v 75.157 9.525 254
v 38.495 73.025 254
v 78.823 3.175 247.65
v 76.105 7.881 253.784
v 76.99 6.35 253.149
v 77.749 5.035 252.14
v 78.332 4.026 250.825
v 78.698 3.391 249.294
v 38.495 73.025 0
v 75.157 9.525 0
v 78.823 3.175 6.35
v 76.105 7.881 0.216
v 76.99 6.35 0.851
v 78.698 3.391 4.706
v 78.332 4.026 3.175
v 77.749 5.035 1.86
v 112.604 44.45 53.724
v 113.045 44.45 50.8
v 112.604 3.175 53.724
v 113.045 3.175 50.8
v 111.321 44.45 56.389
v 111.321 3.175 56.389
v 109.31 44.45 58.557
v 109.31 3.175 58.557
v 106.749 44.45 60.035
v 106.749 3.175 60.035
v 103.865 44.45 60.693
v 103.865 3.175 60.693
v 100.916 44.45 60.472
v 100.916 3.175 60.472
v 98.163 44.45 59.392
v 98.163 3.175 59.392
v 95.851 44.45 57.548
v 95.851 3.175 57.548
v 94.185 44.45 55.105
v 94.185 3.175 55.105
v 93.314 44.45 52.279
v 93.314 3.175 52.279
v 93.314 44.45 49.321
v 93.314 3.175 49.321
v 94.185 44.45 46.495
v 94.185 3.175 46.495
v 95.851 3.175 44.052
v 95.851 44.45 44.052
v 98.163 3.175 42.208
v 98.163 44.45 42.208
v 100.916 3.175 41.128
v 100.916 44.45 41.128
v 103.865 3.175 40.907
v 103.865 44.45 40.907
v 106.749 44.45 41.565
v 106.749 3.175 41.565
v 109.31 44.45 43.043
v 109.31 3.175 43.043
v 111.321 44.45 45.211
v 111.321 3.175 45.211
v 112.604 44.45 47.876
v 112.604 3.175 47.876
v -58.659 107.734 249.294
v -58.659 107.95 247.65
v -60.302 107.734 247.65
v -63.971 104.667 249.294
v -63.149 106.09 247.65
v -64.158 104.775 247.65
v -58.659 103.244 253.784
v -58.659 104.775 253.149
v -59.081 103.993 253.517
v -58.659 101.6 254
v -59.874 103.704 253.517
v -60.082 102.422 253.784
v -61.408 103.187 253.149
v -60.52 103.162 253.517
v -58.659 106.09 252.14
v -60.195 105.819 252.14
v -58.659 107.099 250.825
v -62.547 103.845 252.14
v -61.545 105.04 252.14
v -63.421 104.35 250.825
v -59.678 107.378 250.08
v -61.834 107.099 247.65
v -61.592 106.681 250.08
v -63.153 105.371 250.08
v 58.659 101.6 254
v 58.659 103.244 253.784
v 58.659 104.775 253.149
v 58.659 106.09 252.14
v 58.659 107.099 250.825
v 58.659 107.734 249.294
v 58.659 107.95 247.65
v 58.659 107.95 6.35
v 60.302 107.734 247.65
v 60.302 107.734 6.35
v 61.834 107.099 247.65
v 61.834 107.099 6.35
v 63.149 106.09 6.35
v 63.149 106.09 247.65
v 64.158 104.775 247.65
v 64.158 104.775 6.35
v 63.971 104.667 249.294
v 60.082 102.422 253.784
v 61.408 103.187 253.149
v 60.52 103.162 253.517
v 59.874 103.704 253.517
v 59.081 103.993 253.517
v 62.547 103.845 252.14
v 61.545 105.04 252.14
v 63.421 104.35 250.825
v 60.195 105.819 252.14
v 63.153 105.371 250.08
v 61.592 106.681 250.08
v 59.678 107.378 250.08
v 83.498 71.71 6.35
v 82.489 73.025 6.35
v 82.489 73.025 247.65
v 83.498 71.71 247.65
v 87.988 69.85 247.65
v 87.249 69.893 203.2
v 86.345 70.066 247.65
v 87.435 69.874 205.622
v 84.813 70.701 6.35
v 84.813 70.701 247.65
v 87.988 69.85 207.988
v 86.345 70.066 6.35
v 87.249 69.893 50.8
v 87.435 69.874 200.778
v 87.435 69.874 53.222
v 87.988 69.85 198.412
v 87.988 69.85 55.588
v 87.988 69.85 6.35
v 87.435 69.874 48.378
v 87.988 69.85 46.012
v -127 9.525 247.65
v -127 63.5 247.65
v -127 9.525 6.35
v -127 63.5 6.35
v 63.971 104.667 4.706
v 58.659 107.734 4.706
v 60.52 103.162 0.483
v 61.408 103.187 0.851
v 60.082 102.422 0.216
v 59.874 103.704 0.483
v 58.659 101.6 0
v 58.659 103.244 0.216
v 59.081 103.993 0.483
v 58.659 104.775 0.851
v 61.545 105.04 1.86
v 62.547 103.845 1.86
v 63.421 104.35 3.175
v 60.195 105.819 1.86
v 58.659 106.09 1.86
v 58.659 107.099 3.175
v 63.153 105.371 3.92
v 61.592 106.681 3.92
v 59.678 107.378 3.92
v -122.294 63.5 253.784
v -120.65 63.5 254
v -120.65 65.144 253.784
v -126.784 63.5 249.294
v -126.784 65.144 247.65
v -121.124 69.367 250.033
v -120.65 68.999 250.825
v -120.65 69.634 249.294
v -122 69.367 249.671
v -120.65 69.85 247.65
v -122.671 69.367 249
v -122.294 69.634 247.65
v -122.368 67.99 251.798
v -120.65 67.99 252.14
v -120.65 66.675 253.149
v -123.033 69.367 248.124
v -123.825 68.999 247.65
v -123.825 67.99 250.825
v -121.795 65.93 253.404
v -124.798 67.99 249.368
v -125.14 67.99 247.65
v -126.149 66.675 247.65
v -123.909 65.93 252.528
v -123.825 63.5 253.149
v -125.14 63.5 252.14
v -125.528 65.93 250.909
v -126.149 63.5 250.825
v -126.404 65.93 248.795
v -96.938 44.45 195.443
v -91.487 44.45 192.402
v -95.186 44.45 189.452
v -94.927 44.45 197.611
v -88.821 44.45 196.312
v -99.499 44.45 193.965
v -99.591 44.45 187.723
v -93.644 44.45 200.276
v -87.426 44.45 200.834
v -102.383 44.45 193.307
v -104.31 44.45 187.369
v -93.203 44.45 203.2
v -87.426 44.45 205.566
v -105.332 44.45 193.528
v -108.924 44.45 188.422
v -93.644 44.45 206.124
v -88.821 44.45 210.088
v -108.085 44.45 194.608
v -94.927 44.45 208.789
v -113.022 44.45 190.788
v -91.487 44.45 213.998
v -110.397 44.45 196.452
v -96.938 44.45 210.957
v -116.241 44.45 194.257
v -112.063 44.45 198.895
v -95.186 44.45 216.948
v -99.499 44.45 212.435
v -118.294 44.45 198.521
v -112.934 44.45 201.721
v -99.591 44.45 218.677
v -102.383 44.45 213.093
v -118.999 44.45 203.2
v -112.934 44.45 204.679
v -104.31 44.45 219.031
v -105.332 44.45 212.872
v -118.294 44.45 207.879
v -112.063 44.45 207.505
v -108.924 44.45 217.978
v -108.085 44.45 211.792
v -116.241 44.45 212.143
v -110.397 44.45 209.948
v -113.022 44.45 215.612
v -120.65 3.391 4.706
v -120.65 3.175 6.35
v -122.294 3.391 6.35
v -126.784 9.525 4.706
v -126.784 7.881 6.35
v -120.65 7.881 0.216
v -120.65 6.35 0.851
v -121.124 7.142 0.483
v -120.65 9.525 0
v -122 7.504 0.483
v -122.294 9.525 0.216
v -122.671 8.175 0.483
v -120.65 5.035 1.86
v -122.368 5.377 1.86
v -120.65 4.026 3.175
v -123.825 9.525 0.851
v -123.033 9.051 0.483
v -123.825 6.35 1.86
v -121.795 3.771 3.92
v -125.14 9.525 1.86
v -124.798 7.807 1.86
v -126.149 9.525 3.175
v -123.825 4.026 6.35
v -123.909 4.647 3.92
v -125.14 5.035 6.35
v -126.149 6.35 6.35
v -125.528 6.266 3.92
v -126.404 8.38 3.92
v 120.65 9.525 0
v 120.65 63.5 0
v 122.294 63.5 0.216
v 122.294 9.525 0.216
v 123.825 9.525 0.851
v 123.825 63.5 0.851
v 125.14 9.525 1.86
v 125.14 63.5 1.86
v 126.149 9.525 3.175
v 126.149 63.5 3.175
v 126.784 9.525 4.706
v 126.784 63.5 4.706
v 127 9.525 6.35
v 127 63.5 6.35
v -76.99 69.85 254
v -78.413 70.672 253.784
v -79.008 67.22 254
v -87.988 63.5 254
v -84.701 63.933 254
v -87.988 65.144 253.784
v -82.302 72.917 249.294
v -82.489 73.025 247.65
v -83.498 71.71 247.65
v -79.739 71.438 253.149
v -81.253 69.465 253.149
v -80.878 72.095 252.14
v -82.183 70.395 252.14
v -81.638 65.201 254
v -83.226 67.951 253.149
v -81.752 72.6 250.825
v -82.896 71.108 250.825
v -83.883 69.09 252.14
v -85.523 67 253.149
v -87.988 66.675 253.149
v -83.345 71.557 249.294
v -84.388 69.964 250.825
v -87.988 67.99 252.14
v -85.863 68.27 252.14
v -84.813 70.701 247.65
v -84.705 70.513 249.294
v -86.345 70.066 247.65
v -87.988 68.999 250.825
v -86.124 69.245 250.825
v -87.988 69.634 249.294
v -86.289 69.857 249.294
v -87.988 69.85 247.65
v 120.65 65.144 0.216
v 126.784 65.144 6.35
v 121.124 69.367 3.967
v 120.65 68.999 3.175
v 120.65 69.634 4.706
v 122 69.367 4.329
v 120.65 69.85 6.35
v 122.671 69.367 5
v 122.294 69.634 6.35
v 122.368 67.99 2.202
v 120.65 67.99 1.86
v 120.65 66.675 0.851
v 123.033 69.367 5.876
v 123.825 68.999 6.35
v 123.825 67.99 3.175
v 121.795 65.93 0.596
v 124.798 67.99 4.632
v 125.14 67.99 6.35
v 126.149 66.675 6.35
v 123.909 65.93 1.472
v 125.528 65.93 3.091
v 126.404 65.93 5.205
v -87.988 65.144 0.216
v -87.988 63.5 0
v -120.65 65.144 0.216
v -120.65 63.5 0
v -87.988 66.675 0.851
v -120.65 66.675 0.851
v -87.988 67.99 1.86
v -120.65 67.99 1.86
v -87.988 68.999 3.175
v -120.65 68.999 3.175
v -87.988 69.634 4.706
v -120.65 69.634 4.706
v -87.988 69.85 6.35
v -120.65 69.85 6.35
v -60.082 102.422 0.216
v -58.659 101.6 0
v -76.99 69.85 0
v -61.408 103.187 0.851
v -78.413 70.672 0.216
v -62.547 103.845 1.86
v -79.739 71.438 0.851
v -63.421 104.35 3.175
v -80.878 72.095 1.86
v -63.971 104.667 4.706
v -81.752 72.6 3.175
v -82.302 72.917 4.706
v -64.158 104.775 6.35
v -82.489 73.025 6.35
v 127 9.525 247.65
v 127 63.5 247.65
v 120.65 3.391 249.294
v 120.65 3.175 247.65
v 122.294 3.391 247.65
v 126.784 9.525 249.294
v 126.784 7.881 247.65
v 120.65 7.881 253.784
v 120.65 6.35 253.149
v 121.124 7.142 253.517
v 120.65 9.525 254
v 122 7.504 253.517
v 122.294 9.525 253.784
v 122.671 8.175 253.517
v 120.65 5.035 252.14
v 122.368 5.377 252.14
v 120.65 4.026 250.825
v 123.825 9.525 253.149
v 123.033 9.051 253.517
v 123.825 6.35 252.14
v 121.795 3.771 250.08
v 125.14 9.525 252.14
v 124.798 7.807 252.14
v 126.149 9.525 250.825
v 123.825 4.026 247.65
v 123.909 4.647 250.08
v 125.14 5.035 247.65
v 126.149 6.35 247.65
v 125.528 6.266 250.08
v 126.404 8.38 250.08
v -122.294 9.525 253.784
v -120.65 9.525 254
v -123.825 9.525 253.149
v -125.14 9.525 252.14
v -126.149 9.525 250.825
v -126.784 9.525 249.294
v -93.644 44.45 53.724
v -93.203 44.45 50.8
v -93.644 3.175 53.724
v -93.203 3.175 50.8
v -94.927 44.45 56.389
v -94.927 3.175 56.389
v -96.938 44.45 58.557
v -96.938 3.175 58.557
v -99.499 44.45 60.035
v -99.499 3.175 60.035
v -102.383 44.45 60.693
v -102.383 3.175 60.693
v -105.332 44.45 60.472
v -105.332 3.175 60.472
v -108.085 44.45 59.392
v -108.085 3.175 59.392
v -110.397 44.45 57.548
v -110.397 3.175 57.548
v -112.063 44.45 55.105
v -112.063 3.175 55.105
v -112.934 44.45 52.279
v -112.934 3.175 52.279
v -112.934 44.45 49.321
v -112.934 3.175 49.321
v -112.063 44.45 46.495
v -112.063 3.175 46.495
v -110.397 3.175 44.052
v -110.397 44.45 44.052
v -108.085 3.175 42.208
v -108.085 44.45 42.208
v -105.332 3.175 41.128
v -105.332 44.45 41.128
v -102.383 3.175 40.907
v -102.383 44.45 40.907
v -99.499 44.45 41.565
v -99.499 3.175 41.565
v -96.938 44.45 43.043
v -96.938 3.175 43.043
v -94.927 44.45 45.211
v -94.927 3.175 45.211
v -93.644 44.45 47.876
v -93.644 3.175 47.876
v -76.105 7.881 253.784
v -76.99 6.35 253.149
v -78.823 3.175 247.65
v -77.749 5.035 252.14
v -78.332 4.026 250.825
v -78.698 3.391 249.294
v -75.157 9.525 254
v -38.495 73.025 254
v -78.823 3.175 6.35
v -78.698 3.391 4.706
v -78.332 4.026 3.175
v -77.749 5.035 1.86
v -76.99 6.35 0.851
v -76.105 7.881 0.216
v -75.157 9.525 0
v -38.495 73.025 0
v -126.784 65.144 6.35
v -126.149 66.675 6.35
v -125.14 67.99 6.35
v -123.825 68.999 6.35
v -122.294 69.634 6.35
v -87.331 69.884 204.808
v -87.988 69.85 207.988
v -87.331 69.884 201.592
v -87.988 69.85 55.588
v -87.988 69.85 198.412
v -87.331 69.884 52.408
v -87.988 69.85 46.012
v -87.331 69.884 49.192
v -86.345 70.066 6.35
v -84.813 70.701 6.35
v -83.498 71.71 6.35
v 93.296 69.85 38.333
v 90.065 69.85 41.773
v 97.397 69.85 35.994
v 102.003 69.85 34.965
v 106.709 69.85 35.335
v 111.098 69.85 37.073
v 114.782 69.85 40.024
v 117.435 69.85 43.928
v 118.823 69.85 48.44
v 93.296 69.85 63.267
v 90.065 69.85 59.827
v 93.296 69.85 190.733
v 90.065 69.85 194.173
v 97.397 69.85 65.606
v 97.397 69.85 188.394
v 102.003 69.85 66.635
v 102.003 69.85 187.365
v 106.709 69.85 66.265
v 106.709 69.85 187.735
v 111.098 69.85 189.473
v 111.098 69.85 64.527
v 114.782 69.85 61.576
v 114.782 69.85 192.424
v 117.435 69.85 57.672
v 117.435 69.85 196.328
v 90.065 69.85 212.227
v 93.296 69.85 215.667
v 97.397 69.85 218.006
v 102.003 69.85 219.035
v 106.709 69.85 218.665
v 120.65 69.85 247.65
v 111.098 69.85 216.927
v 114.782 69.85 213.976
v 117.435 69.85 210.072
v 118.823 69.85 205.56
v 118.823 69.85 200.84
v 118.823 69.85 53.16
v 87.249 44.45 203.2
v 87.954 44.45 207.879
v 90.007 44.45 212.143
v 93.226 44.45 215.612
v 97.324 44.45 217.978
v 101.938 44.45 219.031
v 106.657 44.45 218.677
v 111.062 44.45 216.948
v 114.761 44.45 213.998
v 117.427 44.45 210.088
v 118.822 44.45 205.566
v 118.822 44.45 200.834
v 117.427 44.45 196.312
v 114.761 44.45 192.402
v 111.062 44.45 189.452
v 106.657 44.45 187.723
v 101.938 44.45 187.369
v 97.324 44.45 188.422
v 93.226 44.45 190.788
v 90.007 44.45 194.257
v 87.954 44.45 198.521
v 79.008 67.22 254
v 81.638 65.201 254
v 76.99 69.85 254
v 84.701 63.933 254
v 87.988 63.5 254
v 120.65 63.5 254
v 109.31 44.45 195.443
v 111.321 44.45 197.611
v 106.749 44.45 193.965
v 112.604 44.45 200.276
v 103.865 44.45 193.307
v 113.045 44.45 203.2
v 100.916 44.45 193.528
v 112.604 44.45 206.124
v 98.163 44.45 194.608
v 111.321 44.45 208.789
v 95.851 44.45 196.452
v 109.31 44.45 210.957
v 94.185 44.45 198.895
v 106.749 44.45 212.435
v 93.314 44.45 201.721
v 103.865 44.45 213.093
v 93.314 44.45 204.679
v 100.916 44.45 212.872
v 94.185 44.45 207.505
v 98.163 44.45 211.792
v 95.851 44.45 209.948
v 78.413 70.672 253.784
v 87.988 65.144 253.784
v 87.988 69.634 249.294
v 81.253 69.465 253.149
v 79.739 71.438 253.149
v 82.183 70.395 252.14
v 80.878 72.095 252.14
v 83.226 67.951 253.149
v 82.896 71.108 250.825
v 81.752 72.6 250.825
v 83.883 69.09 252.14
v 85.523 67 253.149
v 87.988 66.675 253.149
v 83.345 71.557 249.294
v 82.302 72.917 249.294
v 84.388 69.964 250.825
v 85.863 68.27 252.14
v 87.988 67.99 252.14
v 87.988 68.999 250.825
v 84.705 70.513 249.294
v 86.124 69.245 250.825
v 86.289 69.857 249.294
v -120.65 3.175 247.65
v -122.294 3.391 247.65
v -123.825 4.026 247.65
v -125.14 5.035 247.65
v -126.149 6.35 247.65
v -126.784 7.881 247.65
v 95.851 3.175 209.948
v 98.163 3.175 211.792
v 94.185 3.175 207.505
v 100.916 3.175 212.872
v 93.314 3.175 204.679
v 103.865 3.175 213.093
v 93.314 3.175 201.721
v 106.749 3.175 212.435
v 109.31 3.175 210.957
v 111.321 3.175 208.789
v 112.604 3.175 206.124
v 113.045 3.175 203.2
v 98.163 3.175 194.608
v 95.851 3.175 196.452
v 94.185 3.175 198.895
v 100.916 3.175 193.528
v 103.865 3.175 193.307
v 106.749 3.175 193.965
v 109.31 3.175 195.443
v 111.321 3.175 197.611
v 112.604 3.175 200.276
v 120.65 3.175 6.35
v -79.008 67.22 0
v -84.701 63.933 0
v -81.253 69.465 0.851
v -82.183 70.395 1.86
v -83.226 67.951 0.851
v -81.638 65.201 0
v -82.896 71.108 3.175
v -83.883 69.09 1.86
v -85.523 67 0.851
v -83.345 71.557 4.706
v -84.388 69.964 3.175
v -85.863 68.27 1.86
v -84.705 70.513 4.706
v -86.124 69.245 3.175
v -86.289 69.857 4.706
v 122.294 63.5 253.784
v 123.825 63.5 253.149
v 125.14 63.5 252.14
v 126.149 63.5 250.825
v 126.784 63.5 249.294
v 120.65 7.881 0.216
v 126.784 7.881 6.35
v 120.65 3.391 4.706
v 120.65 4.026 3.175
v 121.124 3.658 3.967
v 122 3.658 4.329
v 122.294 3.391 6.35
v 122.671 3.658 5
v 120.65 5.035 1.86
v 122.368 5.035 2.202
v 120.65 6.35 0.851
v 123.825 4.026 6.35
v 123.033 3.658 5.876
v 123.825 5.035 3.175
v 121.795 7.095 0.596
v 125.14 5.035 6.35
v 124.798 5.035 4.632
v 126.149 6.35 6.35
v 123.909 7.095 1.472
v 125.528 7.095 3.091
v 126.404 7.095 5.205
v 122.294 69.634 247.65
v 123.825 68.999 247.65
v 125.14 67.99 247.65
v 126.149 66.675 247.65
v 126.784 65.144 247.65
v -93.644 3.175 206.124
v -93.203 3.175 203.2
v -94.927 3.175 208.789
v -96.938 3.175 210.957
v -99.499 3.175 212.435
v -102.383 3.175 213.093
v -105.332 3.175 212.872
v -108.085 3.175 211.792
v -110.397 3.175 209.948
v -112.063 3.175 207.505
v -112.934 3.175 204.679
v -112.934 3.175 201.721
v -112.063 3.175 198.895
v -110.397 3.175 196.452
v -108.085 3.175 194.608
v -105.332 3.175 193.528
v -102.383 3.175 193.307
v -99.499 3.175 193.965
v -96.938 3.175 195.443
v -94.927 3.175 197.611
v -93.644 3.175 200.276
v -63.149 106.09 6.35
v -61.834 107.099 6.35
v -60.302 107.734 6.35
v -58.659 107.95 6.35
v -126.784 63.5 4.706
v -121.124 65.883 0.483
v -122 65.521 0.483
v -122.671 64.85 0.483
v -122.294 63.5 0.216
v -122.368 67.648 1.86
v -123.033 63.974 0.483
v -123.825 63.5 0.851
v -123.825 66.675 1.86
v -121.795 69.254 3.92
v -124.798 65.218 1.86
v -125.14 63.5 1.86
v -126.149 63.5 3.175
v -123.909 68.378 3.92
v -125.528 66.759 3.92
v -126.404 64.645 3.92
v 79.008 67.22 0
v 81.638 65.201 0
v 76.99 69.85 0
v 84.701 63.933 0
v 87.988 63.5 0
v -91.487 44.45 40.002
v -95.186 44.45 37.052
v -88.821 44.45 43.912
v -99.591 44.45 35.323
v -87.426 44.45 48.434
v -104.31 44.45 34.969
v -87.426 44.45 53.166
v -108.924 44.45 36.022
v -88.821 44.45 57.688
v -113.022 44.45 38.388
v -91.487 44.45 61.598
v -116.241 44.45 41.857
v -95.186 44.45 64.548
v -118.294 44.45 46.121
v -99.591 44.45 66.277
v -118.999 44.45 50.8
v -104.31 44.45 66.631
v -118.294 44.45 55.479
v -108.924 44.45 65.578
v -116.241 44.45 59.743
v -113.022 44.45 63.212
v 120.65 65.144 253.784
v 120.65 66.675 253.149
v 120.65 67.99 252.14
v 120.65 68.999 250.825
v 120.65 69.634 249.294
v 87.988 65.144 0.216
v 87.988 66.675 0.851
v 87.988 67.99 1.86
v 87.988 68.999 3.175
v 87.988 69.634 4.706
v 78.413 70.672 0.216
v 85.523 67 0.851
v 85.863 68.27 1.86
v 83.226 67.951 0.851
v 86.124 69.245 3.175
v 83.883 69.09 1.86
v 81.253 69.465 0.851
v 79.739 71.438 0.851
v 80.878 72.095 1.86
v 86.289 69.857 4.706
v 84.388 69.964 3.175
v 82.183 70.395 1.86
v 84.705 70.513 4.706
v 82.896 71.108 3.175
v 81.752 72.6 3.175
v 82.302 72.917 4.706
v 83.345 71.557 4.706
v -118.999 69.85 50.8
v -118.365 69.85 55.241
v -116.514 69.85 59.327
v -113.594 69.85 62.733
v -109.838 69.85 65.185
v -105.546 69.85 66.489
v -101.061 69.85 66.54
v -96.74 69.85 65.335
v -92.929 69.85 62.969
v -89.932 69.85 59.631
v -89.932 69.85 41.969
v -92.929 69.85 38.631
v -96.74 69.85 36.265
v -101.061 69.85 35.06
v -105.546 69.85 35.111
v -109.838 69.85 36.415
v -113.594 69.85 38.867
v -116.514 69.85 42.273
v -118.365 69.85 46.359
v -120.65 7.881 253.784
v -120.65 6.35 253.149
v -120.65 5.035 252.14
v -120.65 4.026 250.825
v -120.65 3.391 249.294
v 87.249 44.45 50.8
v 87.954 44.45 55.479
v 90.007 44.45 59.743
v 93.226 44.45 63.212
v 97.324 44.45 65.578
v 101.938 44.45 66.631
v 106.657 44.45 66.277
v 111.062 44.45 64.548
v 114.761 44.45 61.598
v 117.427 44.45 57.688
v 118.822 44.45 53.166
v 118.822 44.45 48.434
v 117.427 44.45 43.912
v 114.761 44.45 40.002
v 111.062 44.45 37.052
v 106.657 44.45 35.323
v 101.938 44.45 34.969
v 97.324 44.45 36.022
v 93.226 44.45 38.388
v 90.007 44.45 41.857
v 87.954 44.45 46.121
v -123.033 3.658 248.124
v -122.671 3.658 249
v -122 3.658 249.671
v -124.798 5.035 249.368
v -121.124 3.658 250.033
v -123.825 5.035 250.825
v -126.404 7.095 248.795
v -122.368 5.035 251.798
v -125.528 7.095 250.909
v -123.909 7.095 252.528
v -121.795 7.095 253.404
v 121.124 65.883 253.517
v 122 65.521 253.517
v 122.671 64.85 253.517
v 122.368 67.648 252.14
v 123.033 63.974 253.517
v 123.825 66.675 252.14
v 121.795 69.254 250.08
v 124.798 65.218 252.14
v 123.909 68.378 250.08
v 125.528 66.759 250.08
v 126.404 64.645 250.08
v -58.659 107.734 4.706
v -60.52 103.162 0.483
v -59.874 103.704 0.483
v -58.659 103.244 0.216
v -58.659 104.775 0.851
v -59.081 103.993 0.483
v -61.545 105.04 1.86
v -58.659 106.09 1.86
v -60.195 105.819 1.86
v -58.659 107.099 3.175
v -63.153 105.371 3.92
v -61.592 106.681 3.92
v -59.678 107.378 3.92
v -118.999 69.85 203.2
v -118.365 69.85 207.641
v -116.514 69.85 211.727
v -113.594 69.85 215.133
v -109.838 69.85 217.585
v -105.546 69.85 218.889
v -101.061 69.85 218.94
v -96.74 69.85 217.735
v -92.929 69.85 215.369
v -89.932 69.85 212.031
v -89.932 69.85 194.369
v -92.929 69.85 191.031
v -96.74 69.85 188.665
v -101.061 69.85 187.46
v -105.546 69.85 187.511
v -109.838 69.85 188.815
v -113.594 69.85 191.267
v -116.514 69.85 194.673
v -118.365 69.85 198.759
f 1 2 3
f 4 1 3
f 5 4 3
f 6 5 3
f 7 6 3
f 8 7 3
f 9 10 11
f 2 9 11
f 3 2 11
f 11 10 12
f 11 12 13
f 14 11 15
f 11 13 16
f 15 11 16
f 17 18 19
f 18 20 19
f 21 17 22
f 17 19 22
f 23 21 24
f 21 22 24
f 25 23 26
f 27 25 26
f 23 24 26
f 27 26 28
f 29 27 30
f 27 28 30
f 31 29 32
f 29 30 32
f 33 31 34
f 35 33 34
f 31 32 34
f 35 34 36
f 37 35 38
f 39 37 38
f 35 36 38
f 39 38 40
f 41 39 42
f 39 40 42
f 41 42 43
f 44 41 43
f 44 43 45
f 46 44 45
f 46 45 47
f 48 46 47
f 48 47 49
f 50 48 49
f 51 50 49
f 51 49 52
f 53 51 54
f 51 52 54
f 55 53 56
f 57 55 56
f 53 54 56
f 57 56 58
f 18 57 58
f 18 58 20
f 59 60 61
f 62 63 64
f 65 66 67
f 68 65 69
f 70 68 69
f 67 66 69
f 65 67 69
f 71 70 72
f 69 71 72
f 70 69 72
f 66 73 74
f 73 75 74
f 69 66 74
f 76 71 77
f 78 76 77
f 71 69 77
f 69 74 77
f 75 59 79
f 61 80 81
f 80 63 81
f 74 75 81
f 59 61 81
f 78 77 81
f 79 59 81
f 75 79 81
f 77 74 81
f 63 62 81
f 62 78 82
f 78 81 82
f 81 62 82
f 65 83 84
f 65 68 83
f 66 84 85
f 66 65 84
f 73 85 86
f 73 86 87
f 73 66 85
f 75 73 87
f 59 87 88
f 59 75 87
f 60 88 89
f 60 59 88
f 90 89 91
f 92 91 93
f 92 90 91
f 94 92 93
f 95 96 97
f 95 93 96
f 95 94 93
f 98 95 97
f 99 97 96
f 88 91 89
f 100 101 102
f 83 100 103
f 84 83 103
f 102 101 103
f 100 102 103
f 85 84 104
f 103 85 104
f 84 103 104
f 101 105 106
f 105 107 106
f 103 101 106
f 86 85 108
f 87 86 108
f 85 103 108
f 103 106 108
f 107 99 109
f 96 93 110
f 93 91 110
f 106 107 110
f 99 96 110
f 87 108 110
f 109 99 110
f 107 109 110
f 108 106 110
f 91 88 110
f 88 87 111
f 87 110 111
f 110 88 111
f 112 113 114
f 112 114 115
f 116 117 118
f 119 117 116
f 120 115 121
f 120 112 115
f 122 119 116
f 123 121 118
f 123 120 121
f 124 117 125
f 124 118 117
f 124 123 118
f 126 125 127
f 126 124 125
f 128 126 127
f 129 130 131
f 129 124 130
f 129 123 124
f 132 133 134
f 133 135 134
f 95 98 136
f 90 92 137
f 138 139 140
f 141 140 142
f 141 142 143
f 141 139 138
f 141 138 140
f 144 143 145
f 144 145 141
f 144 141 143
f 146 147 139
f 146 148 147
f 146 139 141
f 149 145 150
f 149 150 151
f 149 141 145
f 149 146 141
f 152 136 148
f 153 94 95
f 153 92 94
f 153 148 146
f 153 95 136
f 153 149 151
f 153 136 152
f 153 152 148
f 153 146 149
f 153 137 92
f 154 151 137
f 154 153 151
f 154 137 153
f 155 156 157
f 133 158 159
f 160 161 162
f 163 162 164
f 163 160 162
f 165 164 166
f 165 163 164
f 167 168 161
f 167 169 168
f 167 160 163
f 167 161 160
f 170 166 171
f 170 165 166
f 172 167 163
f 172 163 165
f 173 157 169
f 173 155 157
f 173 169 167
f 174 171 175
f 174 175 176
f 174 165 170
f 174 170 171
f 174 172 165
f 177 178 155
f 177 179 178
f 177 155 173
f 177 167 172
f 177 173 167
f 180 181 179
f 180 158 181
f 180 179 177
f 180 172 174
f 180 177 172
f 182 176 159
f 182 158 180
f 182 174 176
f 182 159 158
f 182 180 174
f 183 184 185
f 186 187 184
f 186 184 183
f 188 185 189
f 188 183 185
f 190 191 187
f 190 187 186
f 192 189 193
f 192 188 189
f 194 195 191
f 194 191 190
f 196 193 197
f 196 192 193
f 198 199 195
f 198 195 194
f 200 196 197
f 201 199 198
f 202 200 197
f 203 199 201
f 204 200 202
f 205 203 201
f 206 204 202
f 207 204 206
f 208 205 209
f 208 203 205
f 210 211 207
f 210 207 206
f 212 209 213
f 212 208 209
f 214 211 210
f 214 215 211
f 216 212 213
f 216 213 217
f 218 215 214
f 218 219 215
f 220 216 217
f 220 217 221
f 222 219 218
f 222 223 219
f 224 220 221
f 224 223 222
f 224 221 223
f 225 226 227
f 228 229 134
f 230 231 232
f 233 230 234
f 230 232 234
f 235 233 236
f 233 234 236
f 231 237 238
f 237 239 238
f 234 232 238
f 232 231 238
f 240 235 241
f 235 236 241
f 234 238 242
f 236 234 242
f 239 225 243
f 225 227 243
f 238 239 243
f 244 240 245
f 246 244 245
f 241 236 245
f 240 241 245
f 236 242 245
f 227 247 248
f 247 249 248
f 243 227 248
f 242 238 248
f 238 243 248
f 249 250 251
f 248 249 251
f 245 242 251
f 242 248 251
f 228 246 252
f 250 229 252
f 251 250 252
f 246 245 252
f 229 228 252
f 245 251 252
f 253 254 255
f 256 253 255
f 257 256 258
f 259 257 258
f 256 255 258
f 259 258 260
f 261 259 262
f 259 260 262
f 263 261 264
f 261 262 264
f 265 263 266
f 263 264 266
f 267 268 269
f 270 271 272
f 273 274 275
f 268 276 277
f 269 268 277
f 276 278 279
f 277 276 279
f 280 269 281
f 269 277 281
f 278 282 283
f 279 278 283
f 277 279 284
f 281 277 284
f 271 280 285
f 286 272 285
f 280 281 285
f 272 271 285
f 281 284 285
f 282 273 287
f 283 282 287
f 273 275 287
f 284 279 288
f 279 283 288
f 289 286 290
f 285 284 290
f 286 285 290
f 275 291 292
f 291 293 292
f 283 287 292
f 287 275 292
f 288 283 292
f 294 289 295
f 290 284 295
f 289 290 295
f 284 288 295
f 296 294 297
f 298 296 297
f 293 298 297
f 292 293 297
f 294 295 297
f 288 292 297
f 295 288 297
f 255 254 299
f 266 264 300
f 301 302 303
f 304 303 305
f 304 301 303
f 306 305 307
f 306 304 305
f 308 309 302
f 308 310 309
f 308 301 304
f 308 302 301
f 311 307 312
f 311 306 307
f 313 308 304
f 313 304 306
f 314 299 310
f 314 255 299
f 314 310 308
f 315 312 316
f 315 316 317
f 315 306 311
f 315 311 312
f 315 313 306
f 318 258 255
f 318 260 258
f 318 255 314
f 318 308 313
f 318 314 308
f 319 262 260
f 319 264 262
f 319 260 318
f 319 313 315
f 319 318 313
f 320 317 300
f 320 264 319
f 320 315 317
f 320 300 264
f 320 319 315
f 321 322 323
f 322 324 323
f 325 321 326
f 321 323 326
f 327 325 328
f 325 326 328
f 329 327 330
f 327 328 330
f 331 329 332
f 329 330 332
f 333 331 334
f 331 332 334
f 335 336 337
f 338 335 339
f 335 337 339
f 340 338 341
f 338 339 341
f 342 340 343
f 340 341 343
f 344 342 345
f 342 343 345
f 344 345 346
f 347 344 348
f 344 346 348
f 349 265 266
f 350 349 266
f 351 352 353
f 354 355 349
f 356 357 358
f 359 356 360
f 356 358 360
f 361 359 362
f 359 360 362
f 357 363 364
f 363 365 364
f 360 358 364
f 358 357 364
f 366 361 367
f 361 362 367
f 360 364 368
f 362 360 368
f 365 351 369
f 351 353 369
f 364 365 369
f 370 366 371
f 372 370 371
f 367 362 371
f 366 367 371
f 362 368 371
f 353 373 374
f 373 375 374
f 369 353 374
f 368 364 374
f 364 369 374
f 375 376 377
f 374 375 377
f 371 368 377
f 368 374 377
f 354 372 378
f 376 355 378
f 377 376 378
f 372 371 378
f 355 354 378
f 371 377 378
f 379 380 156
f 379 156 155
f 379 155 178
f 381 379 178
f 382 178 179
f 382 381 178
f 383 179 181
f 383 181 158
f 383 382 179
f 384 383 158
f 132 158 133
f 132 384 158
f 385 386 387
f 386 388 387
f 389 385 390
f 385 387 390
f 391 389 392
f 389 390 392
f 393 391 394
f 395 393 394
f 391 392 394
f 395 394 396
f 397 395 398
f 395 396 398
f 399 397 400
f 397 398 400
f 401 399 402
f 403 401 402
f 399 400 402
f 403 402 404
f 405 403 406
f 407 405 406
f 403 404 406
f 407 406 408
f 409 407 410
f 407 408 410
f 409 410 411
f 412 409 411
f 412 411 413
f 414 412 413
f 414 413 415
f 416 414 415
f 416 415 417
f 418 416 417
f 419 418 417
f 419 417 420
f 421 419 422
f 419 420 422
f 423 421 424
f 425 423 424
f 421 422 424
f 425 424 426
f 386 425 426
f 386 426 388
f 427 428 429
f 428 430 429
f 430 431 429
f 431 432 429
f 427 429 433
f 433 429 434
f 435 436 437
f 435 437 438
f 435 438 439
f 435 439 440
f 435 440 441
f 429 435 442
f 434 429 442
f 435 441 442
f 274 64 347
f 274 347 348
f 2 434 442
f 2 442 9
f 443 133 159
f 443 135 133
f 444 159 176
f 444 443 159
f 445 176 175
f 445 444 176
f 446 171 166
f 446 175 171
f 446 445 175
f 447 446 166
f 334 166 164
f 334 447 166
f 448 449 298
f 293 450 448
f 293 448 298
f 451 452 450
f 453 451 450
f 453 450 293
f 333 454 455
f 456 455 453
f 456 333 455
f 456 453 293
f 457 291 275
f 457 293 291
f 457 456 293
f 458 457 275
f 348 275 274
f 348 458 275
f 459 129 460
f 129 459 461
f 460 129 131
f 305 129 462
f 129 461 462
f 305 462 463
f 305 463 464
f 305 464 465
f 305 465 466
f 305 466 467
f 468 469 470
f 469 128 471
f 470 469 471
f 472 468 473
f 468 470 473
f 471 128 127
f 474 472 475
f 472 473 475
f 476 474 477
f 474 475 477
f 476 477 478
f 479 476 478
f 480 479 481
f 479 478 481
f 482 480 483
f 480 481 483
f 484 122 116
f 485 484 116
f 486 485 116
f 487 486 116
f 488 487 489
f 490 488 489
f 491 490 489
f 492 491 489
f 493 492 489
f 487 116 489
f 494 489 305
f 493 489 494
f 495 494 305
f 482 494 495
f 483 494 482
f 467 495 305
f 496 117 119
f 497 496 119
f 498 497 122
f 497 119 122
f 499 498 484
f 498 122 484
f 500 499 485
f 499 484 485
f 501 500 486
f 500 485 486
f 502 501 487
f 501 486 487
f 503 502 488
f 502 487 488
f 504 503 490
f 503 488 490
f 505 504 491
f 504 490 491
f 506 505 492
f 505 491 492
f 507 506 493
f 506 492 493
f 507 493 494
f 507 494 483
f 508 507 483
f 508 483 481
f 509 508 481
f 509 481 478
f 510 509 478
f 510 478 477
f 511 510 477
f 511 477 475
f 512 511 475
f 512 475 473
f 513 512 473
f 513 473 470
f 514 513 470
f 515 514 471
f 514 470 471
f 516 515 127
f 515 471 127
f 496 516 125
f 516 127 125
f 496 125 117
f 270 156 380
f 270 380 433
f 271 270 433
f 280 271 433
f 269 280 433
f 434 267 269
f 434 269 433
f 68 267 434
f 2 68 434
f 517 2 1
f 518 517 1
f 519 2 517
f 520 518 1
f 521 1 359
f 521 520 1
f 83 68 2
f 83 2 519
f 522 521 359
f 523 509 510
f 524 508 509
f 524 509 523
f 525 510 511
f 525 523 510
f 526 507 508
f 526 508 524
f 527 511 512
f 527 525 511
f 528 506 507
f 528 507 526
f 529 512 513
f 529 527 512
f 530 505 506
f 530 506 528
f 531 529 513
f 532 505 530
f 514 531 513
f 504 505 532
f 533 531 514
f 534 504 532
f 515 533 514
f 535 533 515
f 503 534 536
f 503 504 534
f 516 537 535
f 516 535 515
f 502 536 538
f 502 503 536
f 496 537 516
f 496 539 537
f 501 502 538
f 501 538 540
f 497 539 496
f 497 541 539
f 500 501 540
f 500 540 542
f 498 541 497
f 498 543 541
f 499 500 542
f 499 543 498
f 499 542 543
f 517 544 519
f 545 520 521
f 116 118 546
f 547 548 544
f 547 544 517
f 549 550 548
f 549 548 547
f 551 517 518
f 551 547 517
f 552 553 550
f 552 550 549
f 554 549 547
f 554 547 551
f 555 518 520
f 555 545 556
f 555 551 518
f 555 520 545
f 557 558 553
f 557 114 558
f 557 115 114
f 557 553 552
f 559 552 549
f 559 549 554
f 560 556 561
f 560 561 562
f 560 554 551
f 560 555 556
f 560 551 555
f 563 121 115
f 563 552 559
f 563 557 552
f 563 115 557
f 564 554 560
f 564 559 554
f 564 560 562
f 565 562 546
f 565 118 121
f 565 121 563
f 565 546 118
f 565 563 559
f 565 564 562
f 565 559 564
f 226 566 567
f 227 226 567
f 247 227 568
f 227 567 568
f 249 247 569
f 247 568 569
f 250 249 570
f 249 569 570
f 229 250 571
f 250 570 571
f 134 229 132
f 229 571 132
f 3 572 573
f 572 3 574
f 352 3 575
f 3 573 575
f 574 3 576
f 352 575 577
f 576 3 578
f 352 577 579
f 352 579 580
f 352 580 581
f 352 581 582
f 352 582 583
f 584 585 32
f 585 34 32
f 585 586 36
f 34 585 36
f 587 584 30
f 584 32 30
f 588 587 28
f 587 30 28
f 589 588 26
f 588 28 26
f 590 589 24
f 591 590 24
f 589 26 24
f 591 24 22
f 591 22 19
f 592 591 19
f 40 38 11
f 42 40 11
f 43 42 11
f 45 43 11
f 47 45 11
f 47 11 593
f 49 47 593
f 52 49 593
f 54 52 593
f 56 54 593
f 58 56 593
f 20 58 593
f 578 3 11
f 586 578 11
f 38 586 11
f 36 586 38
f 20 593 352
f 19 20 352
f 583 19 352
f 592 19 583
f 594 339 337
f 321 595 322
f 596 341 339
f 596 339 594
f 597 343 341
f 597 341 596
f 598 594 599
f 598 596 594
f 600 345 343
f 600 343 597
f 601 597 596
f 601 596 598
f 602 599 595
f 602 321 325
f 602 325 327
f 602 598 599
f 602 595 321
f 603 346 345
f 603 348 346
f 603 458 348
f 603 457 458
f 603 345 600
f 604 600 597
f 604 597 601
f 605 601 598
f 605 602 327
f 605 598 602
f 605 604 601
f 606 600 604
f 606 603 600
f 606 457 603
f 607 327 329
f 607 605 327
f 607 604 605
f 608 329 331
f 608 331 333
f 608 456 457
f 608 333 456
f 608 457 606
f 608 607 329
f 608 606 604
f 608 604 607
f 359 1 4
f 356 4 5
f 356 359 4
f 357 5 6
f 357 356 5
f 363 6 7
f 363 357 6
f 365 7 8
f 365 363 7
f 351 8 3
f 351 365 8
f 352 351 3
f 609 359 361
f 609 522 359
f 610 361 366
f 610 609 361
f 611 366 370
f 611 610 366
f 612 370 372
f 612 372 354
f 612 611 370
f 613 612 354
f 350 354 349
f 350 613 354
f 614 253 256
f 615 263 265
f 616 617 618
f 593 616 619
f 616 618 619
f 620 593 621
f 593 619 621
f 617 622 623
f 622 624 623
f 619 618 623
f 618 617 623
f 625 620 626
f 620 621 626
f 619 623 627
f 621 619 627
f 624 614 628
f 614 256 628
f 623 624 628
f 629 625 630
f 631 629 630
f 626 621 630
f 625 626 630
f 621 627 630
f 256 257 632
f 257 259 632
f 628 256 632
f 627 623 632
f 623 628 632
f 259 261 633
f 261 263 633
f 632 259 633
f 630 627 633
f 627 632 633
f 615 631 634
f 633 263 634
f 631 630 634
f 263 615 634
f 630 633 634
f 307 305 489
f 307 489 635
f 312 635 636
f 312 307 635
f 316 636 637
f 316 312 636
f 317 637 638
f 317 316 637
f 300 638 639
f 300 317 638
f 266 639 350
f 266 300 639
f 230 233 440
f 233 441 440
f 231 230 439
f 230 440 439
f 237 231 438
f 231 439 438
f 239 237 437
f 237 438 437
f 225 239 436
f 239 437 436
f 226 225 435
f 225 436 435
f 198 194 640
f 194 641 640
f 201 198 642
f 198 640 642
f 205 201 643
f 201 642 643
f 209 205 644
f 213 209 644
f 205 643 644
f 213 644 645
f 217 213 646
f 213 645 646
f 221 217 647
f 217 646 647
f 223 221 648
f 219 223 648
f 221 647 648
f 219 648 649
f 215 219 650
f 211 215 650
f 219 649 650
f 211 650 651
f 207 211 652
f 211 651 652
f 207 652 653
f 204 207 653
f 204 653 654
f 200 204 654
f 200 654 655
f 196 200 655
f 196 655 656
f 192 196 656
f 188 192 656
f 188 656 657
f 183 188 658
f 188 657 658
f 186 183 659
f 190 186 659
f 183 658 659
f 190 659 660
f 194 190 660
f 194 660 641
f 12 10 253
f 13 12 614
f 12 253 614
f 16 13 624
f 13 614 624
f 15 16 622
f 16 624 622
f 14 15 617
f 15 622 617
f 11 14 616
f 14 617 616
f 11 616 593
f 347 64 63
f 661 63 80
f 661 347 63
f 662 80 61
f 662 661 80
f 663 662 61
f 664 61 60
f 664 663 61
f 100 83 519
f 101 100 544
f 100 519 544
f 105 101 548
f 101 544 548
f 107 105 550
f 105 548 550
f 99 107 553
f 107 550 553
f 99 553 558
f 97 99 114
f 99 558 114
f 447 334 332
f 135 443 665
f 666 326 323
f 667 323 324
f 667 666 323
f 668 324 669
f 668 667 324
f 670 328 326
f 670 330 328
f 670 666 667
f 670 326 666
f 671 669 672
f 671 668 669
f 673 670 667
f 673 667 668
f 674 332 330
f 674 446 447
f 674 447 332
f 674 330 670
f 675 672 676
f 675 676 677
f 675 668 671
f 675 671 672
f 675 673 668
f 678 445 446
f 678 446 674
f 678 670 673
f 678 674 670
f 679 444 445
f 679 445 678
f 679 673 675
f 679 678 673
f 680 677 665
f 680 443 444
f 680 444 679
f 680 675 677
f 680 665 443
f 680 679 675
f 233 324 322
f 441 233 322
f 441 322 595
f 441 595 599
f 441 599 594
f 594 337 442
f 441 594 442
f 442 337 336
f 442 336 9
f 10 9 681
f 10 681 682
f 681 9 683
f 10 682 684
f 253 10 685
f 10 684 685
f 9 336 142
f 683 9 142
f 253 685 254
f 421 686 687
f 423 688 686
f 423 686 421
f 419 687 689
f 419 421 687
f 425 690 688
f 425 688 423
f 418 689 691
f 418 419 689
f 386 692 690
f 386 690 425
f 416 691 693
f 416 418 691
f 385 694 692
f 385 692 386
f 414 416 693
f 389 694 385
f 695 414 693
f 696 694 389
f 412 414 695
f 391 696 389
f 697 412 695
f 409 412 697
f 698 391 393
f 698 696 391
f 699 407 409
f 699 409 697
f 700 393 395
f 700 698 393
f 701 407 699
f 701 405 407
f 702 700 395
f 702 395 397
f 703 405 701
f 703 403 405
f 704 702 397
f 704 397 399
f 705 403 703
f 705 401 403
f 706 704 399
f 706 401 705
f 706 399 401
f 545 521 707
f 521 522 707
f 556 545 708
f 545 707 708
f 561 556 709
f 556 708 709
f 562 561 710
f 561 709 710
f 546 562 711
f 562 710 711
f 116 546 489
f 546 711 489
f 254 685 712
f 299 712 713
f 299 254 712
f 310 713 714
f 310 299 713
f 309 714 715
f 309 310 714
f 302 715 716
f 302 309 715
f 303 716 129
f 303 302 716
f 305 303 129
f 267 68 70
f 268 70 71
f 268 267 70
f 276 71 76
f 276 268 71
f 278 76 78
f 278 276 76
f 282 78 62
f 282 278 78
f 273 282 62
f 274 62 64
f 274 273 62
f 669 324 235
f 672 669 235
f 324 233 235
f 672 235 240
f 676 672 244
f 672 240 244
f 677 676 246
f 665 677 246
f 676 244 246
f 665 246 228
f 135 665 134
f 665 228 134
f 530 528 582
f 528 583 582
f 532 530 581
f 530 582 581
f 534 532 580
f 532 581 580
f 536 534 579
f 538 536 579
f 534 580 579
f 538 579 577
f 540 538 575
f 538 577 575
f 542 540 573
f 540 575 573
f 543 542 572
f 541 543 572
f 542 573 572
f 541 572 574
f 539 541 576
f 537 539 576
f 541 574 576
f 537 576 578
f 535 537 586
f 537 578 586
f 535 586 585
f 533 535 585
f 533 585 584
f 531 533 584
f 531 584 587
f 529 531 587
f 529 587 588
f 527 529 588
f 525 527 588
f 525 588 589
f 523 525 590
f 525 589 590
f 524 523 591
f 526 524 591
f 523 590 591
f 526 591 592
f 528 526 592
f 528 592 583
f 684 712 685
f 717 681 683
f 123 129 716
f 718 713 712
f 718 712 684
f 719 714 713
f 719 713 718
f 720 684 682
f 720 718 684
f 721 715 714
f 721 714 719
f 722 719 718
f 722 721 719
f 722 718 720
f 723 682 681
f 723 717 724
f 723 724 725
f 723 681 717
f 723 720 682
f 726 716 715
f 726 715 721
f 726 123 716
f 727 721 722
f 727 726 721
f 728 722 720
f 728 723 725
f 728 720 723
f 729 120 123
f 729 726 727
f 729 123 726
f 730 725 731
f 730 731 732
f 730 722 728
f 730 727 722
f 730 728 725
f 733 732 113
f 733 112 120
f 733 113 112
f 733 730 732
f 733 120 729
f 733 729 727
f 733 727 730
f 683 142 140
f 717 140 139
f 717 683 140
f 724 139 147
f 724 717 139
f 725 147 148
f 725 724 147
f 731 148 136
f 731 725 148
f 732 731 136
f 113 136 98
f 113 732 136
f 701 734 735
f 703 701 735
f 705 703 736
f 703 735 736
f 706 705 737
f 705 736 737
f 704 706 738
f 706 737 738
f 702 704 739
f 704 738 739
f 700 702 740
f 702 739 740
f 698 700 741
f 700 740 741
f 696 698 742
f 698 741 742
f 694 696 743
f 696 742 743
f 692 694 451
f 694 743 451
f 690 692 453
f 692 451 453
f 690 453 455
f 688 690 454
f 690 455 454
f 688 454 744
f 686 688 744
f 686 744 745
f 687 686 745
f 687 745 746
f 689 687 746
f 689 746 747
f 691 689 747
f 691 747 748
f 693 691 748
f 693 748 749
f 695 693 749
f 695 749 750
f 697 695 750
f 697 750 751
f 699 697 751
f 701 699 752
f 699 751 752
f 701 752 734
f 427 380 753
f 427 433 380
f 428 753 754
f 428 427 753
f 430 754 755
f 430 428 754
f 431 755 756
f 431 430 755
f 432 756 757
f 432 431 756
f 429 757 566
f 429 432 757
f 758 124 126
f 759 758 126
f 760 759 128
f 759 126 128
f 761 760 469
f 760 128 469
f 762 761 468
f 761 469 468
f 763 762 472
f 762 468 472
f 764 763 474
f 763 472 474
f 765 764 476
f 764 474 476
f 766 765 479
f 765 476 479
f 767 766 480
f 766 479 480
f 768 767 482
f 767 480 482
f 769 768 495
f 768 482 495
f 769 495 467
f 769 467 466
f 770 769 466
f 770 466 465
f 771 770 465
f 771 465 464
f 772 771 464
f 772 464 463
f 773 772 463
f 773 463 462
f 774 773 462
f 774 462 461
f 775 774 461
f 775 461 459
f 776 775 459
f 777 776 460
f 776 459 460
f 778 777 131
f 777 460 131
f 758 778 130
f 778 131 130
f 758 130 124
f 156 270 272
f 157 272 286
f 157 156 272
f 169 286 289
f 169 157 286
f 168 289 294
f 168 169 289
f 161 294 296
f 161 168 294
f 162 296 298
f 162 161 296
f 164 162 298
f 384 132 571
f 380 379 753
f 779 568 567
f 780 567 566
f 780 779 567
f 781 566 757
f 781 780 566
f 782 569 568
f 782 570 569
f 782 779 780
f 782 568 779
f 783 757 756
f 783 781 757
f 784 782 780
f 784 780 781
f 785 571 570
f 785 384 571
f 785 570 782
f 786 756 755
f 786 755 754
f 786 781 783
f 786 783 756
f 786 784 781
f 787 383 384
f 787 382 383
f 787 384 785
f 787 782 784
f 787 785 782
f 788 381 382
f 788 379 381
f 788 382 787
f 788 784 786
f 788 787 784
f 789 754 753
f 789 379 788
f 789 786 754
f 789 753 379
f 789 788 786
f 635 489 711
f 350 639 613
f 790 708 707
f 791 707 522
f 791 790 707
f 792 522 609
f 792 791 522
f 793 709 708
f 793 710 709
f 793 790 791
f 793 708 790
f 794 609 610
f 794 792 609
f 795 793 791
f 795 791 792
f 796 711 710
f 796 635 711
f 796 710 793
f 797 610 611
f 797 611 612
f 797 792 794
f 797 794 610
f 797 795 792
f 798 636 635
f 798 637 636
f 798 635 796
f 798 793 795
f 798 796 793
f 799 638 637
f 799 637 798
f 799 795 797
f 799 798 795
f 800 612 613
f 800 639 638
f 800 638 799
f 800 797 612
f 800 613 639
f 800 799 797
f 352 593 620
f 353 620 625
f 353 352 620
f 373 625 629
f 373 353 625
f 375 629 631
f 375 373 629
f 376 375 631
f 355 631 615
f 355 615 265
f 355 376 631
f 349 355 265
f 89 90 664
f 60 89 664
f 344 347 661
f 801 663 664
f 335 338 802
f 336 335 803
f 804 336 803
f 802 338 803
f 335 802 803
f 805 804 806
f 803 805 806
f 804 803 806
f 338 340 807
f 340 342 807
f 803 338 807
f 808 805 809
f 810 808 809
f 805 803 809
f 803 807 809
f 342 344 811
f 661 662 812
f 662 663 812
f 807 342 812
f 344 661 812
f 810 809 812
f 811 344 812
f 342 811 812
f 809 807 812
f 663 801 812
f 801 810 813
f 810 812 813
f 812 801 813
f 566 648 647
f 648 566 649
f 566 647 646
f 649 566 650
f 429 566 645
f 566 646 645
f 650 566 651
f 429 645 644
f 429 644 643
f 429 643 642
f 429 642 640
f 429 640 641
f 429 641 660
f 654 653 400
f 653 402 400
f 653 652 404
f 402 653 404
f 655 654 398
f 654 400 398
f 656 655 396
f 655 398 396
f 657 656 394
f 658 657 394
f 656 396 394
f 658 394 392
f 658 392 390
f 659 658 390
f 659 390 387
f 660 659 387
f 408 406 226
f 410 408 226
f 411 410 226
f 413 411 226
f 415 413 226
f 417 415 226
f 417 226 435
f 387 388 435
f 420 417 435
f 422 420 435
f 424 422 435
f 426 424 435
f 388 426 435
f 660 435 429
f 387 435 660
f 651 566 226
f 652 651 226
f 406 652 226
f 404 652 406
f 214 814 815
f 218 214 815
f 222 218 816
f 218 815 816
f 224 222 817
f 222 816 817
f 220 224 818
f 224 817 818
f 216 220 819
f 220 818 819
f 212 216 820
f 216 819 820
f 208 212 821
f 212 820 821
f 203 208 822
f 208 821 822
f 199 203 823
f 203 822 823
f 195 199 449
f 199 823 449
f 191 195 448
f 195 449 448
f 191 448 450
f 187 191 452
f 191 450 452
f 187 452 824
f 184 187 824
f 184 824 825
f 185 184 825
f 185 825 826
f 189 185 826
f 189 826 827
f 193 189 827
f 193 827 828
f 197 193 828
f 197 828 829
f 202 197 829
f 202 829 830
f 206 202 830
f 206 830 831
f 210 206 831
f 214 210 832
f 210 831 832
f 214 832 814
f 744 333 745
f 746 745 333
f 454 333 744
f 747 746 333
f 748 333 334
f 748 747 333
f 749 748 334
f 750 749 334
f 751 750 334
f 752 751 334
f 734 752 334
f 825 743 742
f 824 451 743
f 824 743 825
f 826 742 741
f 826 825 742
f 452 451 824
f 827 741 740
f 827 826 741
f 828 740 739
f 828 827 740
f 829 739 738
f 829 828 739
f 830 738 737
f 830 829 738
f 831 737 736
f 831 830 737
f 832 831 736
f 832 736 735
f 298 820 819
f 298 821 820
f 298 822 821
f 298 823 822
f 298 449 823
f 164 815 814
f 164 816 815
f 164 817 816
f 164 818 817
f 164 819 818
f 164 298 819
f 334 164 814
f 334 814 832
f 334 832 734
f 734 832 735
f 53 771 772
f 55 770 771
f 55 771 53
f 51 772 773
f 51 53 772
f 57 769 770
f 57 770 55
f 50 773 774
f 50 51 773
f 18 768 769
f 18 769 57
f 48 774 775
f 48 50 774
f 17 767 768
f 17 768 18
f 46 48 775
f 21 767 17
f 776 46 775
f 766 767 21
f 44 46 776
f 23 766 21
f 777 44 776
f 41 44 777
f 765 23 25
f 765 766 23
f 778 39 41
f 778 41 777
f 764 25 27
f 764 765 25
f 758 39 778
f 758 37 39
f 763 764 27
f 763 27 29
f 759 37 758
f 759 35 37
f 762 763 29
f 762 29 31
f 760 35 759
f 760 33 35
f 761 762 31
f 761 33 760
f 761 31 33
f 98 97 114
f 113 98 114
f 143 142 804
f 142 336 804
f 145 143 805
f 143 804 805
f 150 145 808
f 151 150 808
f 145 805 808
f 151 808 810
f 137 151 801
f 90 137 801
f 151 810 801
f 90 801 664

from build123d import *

# Parameters (mm, degrees)
BASE_EXTRUDE_DEPTH                               = 254
CUT_EXTRUDE3_DEPTH                               = 255
FILLET1_R                                        = 6.35
CBORE_FOR_3_4_SOCKET_HEAD_CAP_SCREW1_D           = 19.84248
CBORE_FOR_3_4_SOCKET_HEAD_CAP_SCREW1_CBORE_D     = 31.75
CBORE_FOR_3_4_SOCKET_HEAD_CAP_SCREW1_CBORE_DEPTH = 63.5


with BuildPart() as part:
    # Sketch1 → Base-Extrude (new body)
    with BuildSketch(Plane.XY):
        Polygon((-38.494829198, 73.025), (38.494829198, 73.025), (78.822745501, 3.175), (127, 3.175), (127, 107.95), (-127, 107.95), (-127, 3.175), (-78.822745501, 3.175), align=None)
    extrude(amount=BASE_EXTRUDE_DEPTH)

    # Sketch4 → Cut-Extrude3 (cut, through all)
    with BuildSketch(Plane.XY.offset(254)):
        Polygon((-127, 69.85), (-127, 107.95), (-62.324961559, 107.95), (-84.322006815, 69.85), align=None)
    cut_extrude3 = extrude(amount=-CUT_EXTRUDE3_DEPTH, mode=Mode.SUBTRACT)

    # Mirror1: Cut-Extrude3 across plane
    add(cut_extrude3.mirror(Plane(origin=(0, 0, 0), x_dir=(0, 0, 1), z_dir=(1, 0, 0))), mode=Mode.SUBTRACT)

    # Fillet1
    fillet1_edges = [part.edges().sort_by_distance(p)[0] for p in [
        (127, 36.5125, 0),
        (102.911372751, 3.175, 0),
        (-127, 36.5125, 254),
        (-127, 3.175, 127),
        (127, 3.175, 127),
        (-102.911372751, 3.175, 254),
        (-73.323484187, 88.9, 254),
        (-62.324961559, 107.95, 127),
        (-105.661003408, 69.85, 254),
        (-84.322006815, 69.85, 127),
        (-127, 69.85, 127),
        (-73.323484187, 88.9, 0),
        (-105.661003408, 69.85, 0),
        (0, 107.95, 0),
        (0, 107.95, 254),
        (102.911372751, 3.175, 254),
        (62.324961559, 107.95, 127),
        (105.661003408, 69.85, 0),
        (127, 69.85, 127),
        (73.323484187, 88.9, 0),
        (84.322006815, 69.85, 127),
        (73.323484187, 88.9, 254),
        (105.661003408, 69.85, 254),
        (127, 36.5125, 254),
        (-102.911372751, 3.175, 0),
        (-127, 36.5125, 0),
    ]]
    fillet(fillet1_edges, radius=FILLET1_R)

    # CBORE for 3/4 Socket Head Cap Screw1 (through all)
    with Locations(Plane(origin=(32.15140412, 107.95, 73.186569829), x_dir=(-1, 0, 0), z_dir=(0, 1, 0))):
        with Locations((135.27540412, 130.013430171), (135.27540412, -22.386569829), (-70.97259588, -22.386569829), (-70.97259588, 130.013430171)):
            CounterBoreHole(CBORE_FOR_3_4_SOCKET_HEAD_CAP_SCREW1_D / 2, CBORE_FOR_3_4_SOCKET_HEAD_CAP_SCREW1_CBORE_D / 2, CBORE_FOR_3_4_SOCKET_HEAD_CAP_SCREW1_CBORE_DEPTH)


solid = part.part
